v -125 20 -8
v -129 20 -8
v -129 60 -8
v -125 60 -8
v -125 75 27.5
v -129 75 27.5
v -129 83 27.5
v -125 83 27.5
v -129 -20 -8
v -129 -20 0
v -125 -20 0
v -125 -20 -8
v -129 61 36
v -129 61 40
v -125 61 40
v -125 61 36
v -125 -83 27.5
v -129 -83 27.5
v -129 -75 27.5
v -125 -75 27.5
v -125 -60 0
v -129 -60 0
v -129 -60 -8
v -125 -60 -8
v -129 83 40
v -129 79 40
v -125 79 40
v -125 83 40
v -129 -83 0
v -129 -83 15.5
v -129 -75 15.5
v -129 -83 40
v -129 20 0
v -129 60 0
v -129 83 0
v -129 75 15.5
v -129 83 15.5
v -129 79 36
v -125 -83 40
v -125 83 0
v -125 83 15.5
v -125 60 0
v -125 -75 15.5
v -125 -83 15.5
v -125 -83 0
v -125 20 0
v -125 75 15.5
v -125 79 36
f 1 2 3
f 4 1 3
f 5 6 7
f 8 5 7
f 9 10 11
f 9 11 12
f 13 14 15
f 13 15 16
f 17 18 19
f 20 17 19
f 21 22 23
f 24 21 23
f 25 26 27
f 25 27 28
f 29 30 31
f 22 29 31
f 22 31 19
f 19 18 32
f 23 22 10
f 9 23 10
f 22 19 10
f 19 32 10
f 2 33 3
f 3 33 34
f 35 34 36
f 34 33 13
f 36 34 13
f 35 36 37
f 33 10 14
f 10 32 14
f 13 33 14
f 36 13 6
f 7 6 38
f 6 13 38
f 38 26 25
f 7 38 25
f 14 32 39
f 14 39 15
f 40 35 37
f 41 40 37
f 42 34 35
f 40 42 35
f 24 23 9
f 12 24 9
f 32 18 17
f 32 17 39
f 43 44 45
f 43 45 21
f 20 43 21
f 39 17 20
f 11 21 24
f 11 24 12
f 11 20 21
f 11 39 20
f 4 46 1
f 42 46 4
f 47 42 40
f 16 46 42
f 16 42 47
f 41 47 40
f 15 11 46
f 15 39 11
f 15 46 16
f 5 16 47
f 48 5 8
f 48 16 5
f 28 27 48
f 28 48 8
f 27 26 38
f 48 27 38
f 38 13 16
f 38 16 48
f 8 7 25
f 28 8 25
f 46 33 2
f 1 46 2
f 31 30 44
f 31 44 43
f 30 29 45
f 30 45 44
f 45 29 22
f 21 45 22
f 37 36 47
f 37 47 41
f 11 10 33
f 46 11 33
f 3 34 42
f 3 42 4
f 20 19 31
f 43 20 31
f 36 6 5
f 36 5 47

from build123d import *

# Parameters (mm, degrees)
SKETCH008_W     = 166
SKETCH008_H     = 48
PAD005_DEPTH    = 4
SKETCH028_W     = 40
SKETCH028_H     = 30
SKETCH028_H_2   = 12
POCKET011_DEPTH = 4.001
SKETCH056_W     = 18
SKETCH056_H     = 10
POCKET022_DEPTH = 4.001


with BuildPart() as part:
    # Sketch008 (on DatumPlane) → Pad005 (new body)
    with BuildSketch(Plane(origin=(-129, 0, -4), x_dir=(0, 1, 0), z_dir=(1, 0, 0))):
        with Locations((0, 20)):
            Rectangle(SKETCH008_W, SKETCH008_H)
    extrude(amount=PAD005_DEPTH)

    # Sketch028 (on Face5 of Pad005) → Pocket011 (cut, through all)
    with BuildSketch(Plane(origin=(-129, 0, -4), x_dir=(0, 1, 0), z_dir=(-1, 0, 0))):
        with Locations((-80, 11)):
            Rectangle(SKETCH028_W, SKETCH028_H)
        with Locations((0, 11)):
            Rectangle(SKETCH028_W, SKETCH028_H)
        with Locations((80, 11)):
            Rectangle(SKETCH028_W, SKETCH028_H)
        with Locations((-95, -25.5)):
            Rectangle(SKETCH028_W, SKETCH028_H_2)
        with Locations((95, -25.5)):
            Rectangle(SKETCH028_W, SKETCH028_H_2)
    extrude(amount=-POCKET011_DEPTH, mode=Mode.SUBTRACT)

    # Sketch056 (on Face4 of Pocket011) → Pocket022 (cut, through all)
    with BuildSketch(Plane(origin=(-129, 0, -4), x_dir=(0, 1, 0), z_dir=(-1, 0, 0))):
        with Locations((70, -45)):
            Rectangle(SKETCH056_W, SKETCH056_H)
    extrude(amount=-POCKET022_DEPTH, mode=Mode.SUBTRACT)


solid = part.part
